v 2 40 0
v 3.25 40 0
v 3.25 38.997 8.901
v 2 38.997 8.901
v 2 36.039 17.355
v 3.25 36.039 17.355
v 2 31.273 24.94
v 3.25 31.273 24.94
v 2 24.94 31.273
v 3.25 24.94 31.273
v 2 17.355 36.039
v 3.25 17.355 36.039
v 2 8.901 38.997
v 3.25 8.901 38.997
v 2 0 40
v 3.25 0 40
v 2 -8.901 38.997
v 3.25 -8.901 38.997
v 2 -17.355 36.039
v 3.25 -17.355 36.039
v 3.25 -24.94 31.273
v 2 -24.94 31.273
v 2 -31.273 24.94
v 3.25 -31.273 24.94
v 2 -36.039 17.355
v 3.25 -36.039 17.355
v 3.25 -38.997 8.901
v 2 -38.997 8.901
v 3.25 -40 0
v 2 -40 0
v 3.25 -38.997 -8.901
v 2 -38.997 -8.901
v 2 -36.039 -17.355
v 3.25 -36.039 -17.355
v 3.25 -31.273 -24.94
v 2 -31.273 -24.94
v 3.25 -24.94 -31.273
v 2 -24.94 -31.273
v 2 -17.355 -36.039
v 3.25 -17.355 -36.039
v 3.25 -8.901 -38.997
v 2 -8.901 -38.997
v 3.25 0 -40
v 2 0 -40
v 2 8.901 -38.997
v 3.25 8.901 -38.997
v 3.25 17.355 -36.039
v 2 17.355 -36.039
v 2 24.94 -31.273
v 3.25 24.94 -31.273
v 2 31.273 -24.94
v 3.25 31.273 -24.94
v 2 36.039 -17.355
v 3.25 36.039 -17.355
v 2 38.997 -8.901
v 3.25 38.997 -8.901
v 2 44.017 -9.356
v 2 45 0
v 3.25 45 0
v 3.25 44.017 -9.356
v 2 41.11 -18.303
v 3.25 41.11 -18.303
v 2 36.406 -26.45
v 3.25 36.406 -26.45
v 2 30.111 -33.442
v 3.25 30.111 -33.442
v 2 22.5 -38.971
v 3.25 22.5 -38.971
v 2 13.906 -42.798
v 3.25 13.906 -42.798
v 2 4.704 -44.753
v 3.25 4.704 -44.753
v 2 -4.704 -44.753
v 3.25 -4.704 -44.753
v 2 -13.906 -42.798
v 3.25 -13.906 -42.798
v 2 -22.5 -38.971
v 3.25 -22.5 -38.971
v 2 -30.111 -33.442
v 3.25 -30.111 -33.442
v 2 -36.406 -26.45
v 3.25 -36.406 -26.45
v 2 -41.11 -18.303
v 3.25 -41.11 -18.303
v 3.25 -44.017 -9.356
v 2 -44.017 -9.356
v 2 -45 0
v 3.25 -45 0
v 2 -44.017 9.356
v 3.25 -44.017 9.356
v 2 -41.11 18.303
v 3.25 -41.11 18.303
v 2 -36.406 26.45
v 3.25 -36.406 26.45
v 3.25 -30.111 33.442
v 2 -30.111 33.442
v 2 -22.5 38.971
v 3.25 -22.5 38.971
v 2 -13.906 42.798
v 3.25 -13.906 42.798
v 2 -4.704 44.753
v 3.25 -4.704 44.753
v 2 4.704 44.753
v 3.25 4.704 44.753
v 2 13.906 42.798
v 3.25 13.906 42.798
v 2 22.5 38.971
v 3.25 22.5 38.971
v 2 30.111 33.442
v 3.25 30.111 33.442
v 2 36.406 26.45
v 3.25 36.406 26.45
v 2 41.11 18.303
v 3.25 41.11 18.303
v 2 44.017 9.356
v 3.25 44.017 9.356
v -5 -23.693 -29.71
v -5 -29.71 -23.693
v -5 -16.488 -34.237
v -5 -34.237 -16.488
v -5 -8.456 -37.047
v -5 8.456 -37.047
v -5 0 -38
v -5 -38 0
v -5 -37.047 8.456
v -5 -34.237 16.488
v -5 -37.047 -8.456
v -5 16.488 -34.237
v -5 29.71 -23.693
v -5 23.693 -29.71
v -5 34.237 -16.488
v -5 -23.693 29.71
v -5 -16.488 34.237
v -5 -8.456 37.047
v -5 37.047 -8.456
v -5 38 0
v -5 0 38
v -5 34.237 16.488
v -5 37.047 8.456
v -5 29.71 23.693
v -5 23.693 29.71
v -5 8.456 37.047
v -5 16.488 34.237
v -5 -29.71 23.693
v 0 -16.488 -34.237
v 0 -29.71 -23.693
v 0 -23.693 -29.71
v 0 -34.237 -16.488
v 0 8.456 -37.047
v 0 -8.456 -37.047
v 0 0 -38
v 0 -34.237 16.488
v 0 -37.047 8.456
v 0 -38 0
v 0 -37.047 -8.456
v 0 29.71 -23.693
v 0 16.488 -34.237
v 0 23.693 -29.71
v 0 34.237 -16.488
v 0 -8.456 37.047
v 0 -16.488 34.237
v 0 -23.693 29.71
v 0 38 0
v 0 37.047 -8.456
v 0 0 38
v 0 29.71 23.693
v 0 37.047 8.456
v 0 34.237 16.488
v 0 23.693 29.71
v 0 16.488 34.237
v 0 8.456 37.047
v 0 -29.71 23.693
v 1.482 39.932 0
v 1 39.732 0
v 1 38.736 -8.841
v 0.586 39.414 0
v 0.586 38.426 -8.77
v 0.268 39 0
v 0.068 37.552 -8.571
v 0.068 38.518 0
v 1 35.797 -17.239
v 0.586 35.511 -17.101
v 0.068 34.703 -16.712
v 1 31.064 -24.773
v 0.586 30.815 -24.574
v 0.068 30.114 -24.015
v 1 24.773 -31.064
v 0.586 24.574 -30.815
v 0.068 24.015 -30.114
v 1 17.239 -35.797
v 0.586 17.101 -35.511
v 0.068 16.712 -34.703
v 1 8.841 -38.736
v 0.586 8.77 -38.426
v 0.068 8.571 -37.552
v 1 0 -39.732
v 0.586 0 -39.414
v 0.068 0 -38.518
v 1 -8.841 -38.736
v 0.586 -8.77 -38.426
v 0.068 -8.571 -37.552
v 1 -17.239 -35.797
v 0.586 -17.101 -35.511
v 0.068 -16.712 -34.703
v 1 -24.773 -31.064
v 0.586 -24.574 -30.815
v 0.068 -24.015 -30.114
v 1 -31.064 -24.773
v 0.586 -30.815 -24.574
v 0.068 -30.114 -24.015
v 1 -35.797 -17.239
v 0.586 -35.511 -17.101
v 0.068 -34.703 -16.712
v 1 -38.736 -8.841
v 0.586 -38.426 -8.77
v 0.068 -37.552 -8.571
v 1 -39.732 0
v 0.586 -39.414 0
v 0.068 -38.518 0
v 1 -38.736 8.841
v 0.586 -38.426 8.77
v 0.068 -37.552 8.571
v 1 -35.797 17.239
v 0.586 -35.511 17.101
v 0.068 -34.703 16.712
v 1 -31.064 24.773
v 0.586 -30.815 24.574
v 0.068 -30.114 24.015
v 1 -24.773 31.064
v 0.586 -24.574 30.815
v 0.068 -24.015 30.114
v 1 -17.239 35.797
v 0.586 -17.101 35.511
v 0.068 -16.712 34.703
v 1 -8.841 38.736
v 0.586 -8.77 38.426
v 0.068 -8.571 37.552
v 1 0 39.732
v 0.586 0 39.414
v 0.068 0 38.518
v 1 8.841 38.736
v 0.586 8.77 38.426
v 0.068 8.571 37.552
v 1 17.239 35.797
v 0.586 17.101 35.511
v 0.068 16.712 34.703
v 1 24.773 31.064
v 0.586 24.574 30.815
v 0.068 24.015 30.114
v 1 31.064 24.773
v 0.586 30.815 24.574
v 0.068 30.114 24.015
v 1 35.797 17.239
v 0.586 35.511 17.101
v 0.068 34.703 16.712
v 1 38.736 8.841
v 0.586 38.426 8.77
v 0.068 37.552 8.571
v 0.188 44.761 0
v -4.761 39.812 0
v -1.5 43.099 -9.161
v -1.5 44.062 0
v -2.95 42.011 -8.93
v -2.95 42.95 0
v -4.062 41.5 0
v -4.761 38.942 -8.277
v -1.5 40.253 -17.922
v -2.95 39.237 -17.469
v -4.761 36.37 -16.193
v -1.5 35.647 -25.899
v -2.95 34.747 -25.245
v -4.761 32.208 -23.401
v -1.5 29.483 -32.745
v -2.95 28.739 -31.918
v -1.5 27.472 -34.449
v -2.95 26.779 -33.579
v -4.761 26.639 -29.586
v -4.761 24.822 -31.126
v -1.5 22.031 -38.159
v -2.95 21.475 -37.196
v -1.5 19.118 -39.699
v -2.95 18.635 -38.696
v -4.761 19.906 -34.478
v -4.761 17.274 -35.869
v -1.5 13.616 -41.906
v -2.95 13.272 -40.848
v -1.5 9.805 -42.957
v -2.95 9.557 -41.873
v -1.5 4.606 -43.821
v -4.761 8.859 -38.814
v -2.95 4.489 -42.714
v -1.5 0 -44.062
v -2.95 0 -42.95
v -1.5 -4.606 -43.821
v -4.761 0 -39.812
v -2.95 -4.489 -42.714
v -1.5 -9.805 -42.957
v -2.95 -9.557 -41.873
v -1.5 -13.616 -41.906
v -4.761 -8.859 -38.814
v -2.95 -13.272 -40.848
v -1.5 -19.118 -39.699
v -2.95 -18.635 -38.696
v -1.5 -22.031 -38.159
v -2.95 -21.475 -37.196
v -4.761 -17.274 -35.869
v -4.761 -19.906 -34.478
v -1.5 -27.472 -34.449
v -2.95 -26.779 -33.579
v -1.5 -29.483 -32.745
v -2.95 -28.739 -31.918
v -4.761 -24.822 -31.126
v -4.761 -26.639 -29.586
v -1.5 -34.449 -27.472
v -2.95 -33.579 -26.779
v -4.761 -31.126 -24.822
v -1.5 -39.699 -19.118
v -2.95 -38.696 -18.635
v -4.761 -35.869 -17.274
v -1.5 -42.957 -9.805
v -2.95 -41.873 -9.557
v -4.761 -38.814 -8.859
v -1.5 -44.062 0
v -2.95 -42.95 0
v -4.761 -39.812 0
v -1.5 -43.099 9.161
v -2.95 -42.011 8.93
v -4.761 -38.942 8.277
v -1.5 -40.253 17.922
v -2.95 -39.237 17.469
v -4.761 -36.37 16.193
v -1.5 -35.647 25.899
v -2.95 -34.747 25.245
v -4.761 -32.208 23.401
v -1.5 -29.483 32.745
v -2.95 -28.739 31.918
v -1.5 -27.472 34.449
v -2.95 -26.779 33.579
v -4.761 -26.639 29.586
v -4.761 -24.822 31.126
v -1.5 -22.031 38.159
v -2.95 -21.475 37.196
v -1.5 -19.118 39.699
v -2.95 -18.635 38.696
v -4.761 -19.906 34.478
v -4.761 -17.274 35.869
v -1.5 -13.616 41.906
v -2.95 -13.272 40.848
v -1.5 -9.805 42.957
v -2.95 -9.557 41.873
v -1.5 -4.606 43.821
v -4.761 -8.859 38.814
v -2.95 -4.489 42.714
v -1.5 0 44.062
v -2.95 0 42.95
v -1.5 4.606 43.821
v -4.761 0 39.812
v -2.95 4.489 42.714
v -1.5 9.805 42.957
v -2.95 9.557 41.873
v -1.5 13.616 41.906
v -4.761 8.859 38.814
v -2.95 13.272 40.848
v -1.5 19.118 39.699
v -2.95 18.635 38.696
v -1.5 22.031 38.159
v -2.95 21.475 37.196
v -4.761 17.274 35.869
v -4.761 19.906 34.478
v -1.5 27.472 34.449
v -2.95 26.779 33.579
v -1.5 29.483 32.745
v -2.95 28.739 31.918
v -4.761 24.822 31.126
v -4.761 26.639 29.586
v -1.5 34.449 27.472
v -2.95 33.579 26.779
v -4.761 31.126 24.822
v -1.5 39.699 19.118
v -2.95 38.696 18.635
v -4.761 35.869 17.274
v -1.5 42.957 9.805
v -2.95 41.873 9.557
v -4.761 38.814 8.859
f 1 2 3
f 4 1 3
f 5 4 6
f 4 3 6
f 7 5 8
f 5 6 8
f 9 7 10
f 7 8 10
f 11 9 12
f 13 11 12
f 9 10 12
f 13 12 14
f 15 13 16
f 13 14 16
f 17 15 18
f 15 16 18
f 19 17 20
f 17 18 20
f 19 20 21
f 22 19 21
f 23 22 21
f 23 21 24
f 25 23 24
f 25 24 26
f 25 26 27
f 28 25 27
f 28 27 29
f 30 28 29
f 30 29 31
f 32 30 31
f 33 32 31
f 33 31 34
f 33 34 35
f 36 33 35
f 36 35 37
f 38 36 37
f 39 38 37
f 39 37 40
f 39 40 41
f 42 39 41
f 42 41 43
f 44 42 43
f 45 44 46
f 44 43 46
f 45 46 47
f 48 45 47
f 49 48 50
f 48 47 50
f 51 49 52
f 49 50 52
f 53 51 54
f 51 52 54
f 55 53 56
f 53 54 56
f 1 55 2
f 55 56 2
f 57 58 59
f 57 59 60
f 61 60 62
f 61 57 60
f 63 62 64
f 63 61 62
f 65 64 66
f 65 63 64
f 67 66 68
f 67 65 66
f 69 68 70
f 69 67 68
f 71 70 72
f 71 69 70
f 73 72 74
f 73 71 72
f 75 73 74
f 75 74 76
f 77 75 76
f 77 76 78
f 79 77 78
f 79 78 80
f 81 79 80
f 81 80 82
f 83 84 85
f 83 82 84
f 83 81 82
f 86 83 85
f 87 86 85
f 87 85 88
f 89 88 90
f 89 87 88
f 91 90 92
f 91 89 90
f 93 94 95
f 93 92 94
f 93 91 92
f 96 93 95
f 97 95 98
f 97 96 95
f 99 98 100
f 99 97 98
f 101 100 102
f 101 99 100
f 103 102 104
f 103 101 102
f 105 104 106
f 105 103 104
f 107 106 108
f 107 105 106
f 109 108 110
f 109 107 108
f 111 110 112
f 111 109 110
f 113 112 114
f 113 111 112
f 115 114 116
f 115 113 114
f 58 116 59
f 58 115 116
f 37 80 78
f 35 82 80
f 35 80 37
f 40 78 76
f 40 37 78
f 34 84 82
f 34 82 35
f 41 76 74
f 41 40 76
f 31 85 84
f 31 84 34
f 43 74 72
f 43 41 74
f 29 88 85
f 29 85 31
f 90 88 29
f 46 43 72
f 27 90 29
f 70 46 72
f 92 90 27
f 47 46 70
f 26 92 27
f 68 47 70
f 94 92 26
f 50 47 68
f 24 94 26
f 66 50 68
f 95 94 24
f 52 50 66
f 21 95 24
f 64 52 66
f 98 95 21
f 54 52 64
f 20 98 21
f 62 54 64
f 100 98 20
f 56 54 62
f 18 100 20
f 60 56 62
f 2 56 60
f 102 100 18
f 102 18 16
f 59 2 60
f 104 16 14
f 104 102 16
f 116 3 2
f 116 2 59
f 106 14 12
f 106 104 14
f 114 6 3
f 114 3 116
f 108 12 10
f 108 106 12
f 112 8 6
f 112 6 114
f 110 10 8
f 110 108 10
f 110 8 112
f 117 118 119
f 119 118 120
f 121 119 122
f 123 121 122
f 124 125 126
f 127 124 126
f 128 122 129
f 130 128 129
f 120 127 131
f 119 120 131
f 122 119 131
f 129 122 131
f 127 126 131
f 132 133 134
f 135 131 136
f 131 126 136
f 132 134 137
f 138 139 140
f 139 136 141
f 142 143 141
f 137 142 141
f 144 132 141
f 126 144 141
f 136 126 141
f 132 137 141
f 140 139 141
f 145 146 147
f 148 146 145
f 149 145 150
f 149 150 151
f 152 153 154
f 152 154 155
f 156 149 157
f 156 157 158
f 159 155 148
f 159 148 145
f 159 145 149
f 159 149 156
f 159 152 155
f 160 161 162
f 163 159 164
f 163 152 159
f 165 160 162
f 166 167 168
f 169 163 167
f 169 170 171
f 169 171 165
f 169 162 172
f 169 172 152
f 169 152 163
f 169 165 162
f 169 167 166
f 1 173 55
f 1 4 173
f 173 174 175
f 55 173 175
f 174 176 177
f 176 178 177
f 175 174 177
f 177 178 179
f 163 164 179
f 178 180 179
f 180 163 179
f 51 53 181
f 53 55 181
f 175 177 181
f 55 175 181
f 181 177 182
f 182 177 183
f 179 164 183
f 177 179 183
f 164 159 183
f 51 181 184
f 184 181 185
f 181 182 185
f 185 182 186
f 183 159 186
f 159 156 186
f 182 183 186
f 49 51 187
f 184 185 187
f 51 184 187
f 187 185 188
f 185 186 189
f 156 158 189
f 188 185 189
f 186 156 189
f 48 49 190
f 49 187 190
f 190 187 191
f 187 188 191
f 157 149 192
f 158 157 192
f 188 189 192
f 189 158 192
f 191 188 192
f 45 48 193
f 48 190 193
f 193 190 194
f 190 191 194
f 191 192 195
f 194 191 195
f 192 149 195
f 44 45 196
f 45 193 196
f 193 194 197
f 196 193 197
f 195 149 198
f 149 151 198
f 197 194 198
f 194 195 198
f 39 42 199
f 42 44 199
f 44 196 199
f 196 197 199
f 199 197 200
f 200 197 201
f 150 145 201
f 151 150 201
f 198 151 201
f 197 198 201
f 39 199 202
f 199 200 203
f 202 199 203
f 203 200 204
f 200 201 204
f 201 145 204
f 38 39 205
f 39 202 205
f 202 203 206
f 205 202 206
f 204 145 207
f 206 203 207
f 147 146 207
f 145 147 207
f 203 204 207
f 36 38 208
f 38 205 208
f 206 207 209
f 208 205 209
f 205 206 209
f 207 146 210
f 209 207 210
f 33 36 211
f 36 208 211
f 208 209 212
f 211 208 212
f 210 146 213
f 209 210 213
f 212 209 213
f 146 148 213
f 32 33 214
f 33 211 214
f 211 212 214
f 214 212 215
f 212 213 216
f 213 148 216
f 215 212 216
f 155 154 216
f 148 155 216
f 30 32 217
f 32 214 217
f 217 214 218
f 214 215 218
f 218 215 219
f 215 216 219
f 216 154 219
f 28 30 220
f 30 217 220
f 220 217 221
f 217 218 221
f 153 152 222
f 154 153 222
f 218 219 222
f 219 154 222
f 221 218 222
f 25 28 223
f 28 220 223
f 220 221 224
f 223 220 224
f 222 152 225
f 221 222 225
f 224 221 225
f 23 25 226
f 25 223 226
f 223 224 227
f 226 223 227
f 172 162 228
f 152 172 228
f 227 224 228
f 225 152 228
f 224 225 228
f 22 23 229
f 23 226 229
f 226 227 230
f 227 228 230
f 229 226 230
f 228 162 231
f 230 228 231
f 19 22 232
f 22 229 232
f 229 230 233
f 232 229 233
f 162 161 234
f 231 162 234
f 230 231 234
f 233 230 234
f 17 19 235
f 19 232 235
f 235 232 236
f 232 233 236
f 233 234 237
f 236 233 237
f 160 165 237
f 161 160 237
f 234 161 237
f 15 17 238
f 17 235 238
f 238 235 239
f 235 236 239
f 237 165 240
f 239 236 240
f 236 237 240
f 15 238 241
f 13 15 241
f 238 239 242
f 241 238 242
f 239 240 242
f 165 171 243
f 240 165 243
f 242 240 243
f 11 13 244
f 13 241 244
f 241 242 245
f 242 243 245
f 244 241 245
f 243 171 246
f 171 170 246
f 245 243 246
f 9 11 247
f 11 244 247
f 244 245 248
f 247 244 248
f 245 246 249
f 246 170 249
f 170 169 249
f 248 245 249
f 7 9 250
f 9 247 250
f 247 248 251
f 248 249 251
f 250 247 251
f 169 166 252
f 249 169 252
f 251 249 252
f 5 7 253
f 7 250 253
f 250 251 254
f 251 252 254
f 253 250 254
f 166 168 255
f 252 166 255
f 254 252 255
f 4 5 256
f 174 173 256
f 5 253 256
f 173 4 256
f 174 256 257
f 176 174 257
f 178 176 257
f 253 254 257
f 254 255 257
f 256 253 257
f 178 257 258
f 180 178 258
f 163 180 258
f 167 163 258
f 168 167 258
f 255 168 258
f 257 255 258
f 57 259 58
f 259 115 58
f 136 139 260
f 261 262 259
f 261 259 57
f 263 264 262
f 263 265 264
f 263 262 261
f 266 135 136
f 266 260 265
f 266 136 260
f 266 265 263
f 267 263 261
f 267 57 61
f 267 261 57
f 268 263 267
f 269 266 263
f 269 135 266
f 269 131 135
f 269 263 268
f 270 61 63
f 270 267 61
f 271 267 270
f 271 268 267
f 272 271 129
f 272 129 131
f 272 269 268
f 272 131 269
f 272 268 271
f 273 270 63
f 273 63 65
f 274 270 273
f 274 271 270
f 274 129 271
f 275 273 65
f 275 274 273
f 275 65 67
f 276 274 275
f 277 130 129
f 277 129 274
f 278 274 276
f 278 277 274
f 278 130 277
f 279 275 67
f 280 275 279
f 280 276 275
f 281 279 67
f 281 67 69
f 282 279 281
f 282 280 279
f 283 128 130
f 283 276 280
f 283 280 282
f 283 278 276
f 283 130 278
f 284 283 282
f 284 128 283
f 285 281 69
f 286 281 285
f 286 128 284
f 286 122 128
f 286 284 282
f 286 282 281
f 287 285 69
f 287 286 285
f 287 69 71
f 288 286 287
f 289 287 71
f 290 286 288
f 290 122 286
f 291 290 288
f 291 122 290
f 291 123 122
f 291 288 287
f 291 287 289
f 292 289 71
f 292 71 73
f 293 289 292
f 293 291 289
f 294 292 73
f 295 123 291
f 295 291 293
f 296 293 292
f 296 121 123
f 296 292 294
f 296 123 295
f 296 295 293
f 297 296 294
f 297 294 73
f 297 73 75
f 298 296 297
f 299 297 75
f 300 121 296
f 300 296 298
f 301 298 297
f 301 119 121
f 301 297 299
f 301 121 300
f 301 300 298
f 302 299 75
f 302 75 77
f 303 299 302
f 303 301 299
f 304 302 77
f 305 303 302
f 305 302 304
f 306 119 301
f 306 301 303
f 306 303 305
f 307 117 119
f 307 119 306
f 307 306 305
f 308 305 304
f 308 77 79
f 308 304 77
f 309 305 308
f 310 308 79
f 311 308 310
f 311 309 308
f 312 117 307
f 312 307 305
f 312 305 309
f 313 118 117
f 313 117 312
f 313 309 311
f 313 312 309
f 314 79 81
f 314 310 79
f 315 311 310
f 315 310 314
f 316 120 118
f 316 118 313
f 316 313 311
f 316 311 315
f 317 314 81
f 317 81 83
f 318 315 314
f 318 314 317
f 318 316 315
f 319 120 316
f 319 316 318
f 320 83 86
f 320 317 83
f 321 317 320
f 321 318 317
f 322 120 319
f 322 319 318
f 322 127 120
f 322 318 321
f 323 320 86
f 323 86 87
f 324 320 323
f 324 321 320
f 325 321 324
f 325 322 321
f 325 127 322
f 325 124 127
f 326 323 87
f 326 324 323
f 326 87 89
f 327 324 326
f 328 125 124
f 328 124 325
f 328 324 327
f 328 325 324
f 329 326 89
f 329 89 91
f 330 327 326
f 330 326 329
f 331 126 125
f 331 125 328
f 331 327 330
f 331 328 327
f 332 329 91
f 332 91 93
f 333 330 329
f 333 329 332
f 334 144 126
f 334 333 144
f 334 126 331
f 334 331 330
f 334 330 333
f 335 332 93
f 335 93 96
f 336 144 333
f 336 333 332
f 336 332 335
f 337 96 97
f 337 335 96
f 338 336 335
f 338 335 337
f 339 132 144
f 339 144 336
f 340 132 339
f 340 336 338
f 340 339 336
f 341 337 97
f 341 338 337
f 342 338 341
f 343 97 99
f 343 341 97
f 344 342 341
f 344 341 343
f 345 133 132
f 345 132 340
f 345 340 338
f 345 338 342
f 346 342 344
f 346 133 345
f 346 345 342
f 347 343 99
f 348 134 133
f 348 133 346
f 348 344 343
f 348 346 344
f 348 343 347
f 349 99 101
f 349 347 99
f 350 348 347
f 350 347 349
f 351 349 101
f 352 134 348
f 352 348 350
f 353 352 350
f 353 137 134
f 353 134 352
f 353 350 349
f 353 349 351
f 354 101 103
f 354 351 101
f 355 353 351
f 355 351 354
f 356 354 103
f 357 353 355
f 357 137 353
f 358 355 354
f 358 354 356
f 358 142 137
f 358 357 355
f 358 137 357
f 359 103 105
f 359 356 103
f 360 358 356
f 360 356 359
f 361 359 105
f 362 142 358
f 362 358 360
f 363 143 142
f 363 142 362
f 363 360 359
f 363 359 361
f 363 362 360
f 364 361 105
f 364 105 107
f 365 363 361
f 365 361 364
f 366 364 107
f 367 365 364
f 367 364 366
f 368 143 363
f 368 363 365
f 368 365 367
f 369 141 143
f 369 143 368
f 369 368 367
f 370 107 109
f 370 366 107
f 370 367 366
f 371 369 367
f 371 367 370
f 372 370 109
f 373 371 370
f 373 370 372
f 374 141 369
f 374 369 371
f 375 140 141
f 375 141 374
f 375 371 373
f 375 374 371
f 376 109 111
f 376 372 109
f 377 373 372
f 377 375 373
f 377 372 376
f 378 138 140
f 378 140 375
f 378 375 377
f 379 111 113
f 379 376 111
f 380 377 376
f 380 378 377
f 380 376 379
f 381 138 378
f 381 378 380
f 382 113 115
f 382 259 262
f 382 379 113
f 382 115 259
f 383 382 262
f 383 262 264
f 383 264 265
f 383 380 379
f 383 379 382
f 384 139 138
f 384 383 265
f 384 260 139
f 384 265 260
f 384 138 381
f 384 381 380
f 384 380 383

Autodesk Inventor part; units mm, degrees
ref_plane "YZ Plane" through (0, 0, 0) normal (1, 0, 0) x (0, 1, 0)
ref_plane "XZ Plane" through (0, 0, 0) normal (0, 1, 0) x (-1, 0, 0)
ref_plane "XY Plane" through (0, 0, 0) normal (0, 0, 1) x (1, 0, 0)
sketch "Эскиз1" plane through (0, 0, 0) normal (0, 0, 1) x (1, 0, 0)
  line L0 (0, 0) -> (29.6206, 0)
  line L1 (0, 0) -> (0, 38)
  line L2 (2, 40) -> (3.25, 40)
  arc A0 (2, 40) -> (0, 38) centre (2, 38) ccw
  line L3 (3.25, 45) -> (2, 45)
  arc A1 (2, 45) -> (-5, 38) centre (2, 38) ccw
  line L4 (-5, 38) -> (-5, 0)
  line L5 (-5, 0) -> (0, 0)
  line L6 (3.25, 45) -> (3.25, 40)
  dimension "d0" = 80
  dimension "d1" = 2
  dimension "d2" = 90
  dimension "d5" = 8.25
revolve "Вращение1" add sketch "Эскиз1" angle 360 about axis through (0, 0, 0) along (1, 0, 0)
properties part number "Регулировка-тихая"
